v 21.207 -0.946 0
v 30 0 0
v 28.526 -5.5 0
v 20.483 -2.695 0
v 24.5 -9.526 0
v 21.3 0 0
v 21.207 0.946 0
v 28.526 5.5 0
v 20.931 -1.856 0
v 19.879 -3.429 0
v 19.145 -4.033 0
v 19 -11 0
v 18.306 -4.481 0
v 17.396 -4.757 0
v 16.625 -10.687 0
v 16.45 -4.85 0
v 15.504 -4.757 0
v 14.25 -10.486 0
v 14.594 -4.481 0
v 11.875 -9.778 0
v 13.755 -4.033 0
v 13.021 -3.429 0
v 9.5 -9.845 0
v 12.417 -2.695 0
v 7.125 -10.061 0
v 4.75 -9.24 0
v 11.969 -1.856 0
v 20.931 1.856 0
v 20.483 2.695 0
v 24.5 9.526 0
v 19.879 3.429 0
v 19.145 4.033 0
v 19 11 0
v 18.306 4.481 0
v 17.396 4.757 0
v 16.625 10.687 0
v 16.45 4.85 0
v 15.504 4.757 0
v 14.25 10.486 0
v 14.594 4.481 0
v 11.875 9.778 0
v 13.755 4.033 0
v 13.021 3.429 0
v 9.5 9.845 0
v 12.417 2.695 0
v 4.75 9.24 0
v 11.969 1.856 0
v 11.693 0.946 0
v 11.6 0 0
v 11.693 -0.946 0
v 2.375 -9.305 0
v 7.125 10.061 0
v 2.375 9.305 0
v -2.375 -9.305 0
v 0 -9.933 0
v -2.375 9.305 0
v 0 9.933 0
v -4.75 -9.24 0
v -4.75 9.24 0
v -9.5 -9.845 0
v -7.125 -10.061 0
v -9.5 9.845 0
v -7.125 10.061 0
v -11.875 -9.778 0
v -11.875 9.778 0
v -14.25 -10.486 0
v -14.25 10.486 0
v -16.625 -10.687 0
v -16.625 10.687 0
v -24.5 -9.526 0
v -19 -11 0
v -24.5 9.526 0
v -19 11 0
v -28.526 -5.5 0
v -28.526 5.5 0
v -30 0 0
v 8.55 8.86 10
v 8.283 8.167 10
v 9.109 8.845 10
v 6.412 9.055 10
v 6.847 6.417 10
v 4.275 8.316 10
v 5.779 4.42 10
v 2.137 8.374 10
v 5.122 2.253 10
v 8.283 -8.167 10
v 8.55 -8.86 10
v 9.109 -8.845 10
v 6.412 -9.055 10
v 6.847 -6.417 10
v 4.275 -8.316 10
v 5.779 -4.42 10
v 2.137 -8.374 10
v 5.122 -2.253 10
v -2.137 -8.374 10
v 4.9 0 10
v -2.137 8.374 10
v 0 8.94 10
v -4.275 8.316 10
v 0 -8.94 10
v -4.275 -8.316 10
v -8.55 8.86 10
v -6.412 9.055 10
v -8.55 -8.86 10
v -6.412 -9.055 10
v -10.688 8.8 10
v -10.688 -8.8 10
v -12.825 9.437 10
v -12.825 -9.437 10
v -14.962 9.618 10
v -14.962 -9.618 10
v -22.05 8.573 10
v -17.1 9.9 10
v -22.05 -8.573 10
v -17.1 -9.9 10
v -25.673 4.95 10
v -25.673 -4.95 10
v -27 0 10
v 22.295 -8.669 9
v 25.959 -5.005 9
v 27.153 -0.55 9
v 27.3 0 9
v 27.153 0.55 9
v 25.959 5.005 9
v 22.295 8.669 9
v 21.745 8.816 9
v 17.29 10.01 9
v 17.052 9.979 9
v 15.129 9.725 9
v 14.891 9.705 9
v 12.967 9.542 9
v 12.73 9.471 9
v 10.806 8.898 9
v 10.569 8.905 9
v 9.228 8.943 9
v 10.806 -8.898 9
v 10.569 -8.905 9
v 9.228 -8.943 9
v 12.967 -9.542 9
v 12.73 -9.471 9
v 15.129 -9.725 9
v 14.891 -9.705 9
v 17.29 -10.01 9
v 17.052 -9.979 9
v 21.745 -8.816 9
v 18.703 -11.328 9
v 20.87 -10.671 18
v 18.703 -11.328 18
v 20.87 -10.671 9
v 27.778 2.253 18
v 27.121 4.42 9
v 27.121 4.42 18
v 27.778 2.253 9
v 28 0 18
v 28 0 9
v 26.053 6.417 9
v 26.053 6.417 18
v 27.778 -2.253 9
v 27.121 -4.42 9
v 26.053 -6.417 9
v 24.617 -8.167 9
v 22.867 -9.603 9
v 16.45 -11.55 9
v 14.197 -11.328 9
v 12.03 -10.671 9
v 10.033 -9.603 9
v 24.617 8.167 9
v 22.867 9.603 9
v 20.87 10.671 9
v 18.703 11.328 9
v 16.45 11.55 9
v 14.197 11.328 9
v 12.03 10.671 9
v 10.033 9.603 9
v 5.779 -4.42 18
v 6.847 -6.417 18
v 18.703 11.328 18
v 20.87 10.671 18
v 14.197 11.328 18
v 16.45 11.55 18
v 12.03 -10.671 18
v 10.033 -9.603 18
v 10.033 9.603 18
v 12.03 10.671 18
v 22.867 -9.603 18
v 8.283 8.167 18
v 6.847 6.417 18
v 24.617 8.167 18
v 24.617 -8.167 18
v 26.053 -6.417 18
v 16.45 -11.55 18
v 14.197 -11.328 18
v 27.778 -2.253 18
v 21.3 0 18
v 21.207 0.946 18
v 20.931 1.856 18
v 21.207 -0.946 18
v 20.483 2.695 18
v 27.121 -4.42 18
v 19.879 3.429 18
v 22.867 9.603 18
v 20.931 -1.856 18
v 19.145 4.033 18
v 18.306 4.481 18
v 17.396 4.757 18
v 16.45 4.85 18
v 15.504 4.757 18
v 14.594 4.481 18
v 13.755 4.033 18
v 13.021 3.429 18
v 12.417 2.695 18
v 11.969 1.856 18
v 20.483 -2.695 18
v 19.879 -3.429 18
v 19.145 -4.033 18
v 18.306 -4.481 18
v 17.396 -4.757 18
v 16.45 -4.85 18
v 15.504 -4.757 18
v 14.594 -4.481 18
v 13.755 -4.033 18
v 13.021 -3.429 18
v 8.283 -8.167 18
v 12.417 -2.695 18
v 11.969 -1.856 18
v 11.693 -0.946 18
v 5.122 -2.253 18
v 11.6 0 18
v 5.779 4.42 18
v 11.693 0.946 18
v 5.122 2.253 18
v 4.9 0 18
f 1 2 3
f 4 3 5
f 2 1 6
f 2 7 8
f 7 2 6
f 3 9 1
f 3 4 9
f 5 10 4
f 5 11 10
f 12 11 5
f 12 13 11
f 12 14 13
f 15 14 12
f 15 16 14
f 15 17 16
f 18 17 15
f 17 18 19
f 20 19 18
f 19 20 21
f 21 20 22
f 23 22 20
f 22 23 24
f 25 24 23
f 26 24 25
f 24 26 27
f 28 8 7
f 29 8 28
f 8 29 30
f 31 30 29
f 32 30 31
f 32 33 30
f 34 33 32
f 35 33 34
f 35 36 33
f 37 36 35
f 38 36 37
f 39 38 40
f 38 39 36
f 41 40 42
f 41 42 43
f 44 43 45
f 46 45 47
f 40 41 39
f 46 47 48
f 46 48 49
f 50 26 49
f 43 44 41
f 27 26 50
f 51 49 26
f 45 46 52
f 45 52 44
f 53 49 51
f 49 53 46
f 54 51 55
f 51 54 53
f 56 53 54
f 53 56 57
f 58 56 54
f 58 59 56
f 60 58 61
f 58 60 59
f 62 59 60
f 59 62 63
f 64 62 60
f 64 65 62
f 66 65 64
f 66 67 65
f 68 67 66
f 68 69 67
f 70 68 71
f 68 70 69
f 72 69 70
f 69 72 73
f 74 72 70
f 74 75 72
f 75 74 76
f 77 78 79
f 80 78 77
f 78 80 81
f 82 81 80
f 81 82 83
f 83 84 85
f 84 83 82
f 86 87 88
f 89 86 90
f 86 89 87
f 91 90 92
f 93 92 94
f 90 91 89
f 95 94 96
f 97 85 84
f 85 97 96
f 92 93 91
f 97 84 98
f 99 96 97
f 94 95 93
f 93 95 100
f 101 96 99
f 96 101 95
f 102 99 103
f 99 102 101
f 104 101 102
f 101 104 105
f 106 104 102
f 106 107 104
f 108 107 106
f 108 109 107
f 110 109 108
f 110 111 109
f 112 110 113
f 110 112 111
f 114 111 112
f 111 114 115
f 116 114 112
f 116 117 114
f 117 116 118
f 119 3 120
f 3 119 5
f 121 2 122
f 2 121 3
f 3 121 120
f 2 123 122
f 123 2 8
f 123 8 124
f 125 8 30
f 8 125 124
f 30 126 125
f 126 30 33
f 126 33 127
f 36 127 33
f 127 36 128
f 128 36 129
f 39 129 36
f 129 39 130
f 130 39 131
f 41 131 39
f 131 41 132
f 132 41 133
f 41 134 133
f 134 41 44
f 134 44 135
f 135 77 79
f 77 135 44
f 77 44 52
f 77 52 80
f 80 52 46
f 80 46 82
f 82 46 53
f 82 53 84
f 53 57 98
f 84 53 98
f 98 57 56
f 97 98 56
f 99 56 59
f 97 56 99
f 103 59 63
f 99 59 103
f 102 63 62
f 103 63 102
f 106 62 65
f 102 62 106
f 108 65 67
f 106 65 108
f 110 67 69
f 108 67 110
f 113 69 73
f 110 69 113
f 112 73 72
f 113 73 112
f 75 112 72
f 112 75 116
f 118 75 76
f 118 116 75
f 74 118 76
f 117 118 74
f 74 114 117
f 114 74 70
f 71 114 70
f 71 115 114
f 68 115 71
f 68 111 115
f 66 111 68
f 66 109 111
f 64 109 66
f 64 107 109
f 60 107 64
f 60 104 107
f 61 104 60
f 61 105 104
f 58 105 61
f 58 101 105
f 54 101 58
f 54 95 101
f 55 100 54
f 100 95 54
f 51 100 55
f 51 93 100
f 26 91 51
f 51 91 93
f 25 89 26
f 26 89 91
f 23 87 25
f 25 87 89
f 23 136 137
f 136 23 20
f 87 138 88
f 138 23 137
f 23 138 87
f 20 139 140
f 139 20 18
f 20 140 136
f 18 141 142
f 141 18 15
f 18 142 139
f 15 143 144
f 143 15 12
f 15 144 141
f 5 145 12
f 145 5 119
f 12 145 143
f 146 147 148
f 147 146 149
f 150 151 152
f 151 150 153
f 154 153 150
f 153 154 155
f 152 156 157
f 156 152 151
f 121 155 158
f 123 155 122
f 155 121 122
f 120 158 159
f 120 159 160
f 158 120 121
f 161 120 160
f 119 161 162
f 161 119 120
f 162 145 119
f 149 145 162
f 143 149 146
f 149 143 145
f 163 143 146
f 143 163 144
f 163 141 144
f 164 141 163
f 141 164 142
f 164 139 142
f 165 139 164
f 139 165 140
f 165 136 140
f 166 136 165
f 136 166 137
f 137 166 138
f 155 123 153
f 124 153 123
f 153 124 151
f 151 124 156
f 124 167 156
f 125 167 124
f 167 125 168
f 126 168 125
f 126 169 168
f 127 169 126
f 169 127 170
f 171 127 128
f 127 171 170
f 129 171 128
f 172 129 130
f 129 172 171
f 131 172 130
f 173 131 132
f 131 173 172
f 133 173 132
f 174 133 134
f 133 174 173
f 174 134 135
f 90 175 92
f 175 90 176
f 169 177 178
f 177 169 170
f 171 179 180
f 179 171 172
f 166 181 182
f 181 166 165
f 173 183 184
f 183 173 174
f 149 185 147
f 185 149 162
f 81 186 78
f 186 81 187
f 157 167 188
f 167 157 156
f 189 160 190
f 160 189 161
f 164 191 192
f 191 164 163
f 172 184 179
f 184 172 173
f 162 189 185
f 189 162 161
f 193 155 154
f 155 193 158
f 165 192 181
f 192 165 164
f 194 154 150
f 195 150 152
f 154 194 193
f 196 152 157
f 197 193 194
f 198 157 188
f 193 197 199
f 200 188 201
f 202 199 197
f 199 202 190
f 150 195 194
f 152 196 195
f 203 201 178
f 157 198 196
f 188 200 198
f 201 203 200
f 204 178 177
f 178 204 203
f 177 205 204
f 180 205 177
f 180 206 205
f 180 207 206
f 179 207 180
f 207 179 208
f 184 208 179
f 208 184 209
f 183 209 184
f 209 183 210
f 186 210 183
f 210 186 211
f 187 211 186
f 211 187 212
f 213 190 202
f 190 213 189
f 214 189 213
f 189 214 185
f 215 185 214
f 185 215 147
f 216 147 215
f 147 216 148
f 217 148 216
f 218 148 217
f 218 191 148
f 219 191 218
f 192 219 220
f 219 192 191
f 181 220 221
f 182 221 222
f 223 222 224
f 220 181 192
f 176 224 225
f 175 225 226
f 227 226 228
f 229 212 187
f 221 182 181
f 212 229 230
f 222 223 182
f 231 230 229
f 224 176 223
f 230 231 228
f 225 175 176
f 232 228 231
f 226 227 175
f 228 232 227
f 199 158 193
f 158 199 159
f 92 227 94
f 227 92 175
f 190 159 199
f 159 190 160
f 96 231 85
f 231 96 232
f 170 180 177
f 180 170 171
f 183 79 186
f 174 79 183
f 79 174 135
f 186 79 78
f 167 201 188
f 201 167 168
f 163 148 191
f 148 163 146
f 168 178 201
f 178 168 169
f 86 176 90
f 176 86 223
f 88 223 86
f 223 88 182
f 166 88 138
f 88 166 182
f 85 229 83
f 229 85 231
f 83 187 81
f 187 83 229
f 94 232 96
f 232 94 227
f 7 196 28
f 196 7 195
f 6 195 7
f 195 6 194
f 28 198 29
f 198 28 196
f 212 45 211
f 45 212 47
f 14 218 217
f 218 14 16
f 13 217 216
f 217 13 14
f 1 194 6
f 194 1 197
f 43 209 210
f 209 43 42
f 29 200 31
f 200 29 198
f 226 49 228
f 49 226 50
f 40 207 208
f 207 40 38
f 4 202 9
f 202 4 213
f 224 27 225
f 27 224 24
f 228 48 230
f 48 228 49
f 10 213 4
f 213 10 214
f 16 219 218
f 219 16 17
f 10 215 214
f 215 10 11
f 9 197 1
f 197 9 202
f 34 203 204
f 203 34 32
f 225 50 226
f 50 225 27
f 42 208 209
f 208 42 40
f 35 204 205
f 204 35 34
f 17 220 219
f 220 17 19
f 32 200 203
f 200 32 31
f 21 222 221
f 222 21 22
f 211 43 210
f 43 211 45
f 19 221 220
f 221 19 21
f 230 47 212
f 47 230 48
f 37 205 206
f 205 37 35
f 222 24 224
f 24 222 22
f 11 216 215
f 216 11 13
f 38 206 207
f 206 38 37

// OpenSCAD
$fn = 32;

// ----------------------------------------------------------------------
// Handle: 60 x 22 mm grip, 10 mm thick
// ----------------------------------------------------------------------

// --- parameters (mm) ---
length = 60;              // grip length
width = 22;               // grip width
thickness = 10;           // grip thickness
waist = 0.86;             // width factor at the middle
draft = 0.9;              // top face scale of the extrusion
scallops = 5;             // finger rests per side
ripple = 0.05;            // depth factor of the finger rests
boss_d = 23.1;            // mounting boss diameter
boss_h = 8;               // mounting boss height
boss_hole_d = 9.7;        // screw clearance through the boss
boss_r = 16.45;           // boss centre from the grip centre

/* ergonomic grip outline, closed spline-like polygon in the XY plane */
grip = [[-19, 11], [-16.625, 10.687], [-14.25, 10.486], [-11.875, 9.778], [-9.5, 9.845], [-7.125, 10.061], [-4.75, 9.24], [-2.375, 9.305], [0, 9.933], [2.375, 9.305], [4.75, 9.24], [7.125, 10.061], [9.5, 9.845], [11.875, 9.778], [14.25, 10.486], [16.625, 10.687], [19, 11], [24.5, 9.526], [28.526, 5.5], [30, 0], [28.526, -5.5], [24.5, -9.526], [19, -11], [19, -11], [16.625, -10.687], [14.25, -10.486], [11.875, -9.778], [9.5, -9.845], [7.125, -10.061], [4.75, -9.24], [2.375, -9.305], [0, -9.933], [-2.375, -9.305], [-4.75, -9.24], [-7.125, -10.061], [-9.5, -9.845], [-11.875, -9.778], [-14.25, -10.486], [-16.625, -10.687], [-19, -11], [-24.5, -9.526], [-28.526, -5.5], [-30, 0], [-28.526, 5.5], [-24.5, 9.526], [-19, 11]];

module grip_body() {
  linear_extrude(height = thickness, scale = draft) polygon(grip);
}

module boss_body() {
  /* sunk 1 mm into the grip so the joint overlaps */
  translate([boss_r, 0, thickness - 1]) cylinder(h = boss_h + 1, d = boss_d);
}

difference() {
  union() {
    grip_body();
    boss_body();
  }
  translate([boss_r, 0, -1]) cylinder(h = thickness + boss_h + 2, d = boss_hole_d);
}
